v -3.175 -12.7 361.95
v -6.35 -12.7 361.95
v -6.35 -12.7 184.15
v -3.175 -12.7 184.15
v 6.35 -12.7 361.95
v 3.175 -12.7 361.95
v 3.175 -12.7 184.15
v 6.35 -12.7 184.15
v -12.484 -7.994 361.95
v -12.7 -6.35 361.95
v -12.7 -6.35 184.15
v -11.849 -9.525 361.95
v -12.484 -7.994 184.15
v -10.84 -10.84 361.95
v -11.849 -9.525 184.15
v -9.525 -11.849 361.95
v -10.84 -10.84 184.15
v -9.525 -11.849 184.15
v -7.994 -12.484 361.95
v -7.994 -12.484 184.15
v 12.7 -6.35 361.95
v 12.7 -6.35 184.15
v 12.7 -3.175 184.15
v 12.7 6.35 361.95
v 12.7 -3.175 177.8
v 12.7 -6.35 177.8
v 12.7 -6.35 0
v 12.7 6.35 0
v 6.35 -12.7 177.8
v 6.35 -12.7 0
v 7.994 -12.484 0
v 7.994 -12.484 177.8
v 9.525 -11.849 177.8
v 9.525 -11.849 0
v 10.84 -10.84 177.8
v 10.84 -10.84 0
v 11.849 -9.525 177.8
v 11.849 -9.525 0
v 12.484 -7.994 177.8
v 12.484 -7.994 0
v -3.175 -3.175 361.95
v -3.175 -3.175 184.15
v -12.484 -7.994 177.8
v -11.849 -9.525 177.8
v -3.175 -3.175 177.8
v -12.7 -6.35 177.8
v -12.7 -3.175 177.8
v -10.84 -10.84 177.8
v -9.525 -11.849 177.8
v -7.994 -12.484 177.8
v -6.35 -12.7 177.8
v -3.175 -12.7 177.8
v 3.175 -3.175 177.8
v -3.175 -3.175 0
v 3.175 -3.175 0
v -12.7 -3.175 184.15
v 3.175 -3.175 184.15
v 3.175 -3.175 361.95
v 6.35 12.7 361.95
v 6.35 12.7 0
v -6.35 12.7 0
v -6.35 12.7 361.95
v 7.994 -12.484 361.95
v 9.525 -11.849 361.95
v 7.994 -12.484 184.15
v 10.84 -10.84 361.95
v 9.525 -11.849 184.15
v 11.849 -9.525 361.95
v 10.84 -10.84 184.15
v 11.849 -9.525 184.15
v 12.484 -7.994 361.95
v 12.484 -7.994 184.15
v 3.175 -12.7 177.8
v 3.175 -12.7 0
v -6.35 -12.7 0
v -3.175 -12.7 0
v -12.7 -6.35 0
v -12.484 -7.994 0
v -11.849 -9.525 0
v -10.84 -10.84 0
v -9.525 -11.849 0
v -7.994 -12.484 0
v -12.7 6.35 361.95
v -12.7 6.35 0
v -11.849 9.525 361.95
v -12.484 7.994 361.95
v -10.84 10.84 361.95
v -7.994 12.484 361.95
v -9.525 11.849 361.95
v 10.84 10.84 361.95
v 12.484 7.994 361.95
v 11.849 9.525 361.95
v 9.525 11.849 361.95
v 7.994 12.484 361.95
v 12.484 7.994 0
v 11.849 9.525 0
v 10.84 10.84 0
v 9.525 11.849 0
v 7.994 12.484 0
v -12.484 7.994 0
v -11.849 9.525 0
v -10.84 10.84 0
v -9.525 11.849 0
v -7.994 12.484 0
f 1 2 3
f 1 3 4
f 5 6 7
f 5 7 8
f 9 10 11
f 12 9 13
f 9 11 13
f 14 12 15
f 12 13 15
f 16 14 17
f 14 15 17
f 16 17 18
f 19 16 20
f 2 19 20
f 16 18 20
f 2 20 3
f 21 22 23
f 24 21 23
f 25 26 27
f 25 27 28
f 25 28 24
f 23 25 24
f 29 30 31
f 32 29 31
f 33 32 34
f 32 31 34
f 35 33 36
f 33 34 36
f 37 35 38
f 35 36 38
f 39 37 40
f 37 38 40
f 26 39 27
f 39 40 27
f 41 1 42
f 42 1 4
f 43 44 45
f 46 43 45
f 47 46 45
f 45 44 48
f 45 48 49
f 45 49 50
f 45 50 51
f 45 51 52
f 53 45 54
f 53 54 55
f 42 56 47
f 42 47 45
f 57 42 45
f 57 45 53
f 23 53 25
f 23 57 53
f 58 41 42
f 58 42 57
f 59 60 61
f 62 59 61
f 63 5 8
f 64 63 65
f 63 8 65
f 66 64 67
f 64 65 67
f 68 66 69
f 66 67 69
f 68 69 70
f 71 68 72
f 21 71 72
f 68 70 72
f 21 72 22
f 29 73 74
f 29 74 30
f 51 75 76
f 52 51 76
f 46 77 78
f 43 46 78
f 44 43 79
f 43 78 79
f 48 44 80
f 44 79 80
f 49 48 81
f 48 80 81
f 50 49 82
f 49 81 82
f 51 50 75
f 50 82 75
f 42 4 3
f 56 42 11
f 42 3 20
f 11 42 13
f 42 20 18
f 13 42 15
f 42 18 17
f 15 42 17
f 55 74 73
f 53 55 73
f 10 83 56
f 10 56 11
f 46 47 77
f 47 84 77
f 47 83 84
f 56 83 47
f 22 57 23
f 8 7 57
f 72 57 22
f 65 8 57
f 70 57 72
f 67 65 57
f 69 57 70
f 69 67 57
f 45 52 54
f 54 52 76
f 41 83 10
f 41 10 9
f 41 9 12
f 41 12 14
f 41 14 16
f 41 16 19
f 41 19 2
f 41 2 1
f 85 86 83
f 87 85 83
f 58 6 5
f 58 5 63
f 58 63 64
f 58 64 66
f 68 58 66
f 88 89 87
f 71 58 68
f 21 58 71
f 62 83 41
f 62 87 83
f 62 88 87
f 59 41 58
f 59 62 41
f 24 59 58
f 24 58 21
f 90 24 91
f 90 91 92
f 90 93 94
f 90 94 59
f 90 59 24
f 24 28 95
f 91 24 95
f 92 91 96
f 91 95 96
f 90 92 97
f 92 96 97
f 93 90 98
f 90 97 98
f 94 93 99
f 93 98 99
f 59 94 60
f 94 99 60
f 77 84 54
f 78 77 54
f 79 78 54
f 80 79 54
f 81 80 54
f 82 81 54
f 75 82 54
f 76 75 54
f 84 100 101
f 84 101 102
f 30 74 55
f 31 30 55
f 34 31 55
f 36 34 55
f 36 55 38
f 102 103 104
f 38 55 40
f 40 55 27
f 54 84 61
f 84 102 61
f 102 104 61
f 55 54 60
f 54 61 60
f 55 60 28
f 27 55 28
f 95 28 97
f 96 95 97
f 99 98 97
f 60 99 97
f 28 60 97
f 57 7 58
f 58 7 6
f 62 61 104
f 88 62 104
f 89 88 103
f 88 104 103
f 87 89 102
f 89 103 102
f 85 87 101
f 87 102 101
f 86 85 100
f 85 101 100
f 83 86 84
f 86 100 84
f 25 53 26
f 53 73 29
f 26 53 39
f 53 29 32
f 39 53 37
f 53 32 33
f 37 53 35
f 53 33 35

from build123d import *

# Parameters (mm, degrees)
F1_DEPTH = 361.95
F2_W     = 3.175
F2_H     = 6.35
F2_W_2   = 6.35
F3_DEPTH = 9.525
F2_H_2   = 177.8
F4_DEPTH = 9.525
F5_DEPTH = 9.525


with BuildPart() as f1:
    # F0 (on Top) → F1 (new body)
    with BuildSketch(Plane.XY):
        with BuildLine():
            ThreePointArc((12.7, 6.35), (10.8401280605, 10.8401280605), (6.35, 12.7))
            Line((6.35, 12.7), (-6.35, 12.7))
            ThreePointArc((-6.35, 12.7), (-10.8401280605, 10.8401280605), (-12.7, 6.35))
            Line((-12.7, 6.35), (-12.7, -6.35))
            ThreePointArc((-12.7, -6.35), (-10.8401280605, -10.8401280605), (-6.35, -12.7))
            Line((-6.35, -12.7), (6.35, -12.7))
            ThreePointArc((6.35, -12.7), (10.8401280605, -10.8401280605), (12.7, -6.35))
            Line((12.7, -6.35), (12.7, 6.35))
        make_face()
    extrude(amount=F1_DEPTH)

    # F2 (on face) → F3 (cut)
    with BuildSketch(Plane.XZ.offset(12.7)):
        with Locations((-4.7625, 180.975)):
            Rectangle(F2_W, F2_H)
        with Locations((-9.525, 180.975)):
            Rectangle(F2_W_2, F2_H)
        with Locations((9.525, 180.975)):
            Rectangle(F2_W_2, F2_H)
    extrude(amount=-F3_DEPTH, mode=Mode.SUBTRACT)

    # F2 (on face) → F4 (cut)
    with BuildSketch(Plane.XZ.offset(12.7)):
        with Locations((0, 273.05)):
            Rectangle(F2_W_2, F2_H_2)
        with Locations((0, 88.9)):
            Rectangle(F2_W_2, F2_H_2)
        with Locations((0, 180.975)):
            Rectangle(F2_W_2, F2_H)
    extrude(amount=-F4_DEPTH, mode=Mode.SUBTRACT)

    # F2 (on face) → F5 (cut)
    with BuildSketch(Plane.XZ.offset(12.7)):
        with Locations((4.7625, 180.975)):
            Rectangle(F2_W, F2_H)
        with Locations((9.525, 180.975)):
            Rectangle(F2_W_2, F2_H)
        with Locations((-4.7625, 180.975)):
            Rectangle(F2_W, F2_H)
        with Locations((0, 180.975)):
            Rectangle(F2_W_2, F2_H)
        with Locations((-9.525, 180.975)):
            Rectangle(F2_W_2, F2_H)
    extrude(amount=-F5_DEPTH, mode=Mode.SUBTRACT)


solid = f1.part
